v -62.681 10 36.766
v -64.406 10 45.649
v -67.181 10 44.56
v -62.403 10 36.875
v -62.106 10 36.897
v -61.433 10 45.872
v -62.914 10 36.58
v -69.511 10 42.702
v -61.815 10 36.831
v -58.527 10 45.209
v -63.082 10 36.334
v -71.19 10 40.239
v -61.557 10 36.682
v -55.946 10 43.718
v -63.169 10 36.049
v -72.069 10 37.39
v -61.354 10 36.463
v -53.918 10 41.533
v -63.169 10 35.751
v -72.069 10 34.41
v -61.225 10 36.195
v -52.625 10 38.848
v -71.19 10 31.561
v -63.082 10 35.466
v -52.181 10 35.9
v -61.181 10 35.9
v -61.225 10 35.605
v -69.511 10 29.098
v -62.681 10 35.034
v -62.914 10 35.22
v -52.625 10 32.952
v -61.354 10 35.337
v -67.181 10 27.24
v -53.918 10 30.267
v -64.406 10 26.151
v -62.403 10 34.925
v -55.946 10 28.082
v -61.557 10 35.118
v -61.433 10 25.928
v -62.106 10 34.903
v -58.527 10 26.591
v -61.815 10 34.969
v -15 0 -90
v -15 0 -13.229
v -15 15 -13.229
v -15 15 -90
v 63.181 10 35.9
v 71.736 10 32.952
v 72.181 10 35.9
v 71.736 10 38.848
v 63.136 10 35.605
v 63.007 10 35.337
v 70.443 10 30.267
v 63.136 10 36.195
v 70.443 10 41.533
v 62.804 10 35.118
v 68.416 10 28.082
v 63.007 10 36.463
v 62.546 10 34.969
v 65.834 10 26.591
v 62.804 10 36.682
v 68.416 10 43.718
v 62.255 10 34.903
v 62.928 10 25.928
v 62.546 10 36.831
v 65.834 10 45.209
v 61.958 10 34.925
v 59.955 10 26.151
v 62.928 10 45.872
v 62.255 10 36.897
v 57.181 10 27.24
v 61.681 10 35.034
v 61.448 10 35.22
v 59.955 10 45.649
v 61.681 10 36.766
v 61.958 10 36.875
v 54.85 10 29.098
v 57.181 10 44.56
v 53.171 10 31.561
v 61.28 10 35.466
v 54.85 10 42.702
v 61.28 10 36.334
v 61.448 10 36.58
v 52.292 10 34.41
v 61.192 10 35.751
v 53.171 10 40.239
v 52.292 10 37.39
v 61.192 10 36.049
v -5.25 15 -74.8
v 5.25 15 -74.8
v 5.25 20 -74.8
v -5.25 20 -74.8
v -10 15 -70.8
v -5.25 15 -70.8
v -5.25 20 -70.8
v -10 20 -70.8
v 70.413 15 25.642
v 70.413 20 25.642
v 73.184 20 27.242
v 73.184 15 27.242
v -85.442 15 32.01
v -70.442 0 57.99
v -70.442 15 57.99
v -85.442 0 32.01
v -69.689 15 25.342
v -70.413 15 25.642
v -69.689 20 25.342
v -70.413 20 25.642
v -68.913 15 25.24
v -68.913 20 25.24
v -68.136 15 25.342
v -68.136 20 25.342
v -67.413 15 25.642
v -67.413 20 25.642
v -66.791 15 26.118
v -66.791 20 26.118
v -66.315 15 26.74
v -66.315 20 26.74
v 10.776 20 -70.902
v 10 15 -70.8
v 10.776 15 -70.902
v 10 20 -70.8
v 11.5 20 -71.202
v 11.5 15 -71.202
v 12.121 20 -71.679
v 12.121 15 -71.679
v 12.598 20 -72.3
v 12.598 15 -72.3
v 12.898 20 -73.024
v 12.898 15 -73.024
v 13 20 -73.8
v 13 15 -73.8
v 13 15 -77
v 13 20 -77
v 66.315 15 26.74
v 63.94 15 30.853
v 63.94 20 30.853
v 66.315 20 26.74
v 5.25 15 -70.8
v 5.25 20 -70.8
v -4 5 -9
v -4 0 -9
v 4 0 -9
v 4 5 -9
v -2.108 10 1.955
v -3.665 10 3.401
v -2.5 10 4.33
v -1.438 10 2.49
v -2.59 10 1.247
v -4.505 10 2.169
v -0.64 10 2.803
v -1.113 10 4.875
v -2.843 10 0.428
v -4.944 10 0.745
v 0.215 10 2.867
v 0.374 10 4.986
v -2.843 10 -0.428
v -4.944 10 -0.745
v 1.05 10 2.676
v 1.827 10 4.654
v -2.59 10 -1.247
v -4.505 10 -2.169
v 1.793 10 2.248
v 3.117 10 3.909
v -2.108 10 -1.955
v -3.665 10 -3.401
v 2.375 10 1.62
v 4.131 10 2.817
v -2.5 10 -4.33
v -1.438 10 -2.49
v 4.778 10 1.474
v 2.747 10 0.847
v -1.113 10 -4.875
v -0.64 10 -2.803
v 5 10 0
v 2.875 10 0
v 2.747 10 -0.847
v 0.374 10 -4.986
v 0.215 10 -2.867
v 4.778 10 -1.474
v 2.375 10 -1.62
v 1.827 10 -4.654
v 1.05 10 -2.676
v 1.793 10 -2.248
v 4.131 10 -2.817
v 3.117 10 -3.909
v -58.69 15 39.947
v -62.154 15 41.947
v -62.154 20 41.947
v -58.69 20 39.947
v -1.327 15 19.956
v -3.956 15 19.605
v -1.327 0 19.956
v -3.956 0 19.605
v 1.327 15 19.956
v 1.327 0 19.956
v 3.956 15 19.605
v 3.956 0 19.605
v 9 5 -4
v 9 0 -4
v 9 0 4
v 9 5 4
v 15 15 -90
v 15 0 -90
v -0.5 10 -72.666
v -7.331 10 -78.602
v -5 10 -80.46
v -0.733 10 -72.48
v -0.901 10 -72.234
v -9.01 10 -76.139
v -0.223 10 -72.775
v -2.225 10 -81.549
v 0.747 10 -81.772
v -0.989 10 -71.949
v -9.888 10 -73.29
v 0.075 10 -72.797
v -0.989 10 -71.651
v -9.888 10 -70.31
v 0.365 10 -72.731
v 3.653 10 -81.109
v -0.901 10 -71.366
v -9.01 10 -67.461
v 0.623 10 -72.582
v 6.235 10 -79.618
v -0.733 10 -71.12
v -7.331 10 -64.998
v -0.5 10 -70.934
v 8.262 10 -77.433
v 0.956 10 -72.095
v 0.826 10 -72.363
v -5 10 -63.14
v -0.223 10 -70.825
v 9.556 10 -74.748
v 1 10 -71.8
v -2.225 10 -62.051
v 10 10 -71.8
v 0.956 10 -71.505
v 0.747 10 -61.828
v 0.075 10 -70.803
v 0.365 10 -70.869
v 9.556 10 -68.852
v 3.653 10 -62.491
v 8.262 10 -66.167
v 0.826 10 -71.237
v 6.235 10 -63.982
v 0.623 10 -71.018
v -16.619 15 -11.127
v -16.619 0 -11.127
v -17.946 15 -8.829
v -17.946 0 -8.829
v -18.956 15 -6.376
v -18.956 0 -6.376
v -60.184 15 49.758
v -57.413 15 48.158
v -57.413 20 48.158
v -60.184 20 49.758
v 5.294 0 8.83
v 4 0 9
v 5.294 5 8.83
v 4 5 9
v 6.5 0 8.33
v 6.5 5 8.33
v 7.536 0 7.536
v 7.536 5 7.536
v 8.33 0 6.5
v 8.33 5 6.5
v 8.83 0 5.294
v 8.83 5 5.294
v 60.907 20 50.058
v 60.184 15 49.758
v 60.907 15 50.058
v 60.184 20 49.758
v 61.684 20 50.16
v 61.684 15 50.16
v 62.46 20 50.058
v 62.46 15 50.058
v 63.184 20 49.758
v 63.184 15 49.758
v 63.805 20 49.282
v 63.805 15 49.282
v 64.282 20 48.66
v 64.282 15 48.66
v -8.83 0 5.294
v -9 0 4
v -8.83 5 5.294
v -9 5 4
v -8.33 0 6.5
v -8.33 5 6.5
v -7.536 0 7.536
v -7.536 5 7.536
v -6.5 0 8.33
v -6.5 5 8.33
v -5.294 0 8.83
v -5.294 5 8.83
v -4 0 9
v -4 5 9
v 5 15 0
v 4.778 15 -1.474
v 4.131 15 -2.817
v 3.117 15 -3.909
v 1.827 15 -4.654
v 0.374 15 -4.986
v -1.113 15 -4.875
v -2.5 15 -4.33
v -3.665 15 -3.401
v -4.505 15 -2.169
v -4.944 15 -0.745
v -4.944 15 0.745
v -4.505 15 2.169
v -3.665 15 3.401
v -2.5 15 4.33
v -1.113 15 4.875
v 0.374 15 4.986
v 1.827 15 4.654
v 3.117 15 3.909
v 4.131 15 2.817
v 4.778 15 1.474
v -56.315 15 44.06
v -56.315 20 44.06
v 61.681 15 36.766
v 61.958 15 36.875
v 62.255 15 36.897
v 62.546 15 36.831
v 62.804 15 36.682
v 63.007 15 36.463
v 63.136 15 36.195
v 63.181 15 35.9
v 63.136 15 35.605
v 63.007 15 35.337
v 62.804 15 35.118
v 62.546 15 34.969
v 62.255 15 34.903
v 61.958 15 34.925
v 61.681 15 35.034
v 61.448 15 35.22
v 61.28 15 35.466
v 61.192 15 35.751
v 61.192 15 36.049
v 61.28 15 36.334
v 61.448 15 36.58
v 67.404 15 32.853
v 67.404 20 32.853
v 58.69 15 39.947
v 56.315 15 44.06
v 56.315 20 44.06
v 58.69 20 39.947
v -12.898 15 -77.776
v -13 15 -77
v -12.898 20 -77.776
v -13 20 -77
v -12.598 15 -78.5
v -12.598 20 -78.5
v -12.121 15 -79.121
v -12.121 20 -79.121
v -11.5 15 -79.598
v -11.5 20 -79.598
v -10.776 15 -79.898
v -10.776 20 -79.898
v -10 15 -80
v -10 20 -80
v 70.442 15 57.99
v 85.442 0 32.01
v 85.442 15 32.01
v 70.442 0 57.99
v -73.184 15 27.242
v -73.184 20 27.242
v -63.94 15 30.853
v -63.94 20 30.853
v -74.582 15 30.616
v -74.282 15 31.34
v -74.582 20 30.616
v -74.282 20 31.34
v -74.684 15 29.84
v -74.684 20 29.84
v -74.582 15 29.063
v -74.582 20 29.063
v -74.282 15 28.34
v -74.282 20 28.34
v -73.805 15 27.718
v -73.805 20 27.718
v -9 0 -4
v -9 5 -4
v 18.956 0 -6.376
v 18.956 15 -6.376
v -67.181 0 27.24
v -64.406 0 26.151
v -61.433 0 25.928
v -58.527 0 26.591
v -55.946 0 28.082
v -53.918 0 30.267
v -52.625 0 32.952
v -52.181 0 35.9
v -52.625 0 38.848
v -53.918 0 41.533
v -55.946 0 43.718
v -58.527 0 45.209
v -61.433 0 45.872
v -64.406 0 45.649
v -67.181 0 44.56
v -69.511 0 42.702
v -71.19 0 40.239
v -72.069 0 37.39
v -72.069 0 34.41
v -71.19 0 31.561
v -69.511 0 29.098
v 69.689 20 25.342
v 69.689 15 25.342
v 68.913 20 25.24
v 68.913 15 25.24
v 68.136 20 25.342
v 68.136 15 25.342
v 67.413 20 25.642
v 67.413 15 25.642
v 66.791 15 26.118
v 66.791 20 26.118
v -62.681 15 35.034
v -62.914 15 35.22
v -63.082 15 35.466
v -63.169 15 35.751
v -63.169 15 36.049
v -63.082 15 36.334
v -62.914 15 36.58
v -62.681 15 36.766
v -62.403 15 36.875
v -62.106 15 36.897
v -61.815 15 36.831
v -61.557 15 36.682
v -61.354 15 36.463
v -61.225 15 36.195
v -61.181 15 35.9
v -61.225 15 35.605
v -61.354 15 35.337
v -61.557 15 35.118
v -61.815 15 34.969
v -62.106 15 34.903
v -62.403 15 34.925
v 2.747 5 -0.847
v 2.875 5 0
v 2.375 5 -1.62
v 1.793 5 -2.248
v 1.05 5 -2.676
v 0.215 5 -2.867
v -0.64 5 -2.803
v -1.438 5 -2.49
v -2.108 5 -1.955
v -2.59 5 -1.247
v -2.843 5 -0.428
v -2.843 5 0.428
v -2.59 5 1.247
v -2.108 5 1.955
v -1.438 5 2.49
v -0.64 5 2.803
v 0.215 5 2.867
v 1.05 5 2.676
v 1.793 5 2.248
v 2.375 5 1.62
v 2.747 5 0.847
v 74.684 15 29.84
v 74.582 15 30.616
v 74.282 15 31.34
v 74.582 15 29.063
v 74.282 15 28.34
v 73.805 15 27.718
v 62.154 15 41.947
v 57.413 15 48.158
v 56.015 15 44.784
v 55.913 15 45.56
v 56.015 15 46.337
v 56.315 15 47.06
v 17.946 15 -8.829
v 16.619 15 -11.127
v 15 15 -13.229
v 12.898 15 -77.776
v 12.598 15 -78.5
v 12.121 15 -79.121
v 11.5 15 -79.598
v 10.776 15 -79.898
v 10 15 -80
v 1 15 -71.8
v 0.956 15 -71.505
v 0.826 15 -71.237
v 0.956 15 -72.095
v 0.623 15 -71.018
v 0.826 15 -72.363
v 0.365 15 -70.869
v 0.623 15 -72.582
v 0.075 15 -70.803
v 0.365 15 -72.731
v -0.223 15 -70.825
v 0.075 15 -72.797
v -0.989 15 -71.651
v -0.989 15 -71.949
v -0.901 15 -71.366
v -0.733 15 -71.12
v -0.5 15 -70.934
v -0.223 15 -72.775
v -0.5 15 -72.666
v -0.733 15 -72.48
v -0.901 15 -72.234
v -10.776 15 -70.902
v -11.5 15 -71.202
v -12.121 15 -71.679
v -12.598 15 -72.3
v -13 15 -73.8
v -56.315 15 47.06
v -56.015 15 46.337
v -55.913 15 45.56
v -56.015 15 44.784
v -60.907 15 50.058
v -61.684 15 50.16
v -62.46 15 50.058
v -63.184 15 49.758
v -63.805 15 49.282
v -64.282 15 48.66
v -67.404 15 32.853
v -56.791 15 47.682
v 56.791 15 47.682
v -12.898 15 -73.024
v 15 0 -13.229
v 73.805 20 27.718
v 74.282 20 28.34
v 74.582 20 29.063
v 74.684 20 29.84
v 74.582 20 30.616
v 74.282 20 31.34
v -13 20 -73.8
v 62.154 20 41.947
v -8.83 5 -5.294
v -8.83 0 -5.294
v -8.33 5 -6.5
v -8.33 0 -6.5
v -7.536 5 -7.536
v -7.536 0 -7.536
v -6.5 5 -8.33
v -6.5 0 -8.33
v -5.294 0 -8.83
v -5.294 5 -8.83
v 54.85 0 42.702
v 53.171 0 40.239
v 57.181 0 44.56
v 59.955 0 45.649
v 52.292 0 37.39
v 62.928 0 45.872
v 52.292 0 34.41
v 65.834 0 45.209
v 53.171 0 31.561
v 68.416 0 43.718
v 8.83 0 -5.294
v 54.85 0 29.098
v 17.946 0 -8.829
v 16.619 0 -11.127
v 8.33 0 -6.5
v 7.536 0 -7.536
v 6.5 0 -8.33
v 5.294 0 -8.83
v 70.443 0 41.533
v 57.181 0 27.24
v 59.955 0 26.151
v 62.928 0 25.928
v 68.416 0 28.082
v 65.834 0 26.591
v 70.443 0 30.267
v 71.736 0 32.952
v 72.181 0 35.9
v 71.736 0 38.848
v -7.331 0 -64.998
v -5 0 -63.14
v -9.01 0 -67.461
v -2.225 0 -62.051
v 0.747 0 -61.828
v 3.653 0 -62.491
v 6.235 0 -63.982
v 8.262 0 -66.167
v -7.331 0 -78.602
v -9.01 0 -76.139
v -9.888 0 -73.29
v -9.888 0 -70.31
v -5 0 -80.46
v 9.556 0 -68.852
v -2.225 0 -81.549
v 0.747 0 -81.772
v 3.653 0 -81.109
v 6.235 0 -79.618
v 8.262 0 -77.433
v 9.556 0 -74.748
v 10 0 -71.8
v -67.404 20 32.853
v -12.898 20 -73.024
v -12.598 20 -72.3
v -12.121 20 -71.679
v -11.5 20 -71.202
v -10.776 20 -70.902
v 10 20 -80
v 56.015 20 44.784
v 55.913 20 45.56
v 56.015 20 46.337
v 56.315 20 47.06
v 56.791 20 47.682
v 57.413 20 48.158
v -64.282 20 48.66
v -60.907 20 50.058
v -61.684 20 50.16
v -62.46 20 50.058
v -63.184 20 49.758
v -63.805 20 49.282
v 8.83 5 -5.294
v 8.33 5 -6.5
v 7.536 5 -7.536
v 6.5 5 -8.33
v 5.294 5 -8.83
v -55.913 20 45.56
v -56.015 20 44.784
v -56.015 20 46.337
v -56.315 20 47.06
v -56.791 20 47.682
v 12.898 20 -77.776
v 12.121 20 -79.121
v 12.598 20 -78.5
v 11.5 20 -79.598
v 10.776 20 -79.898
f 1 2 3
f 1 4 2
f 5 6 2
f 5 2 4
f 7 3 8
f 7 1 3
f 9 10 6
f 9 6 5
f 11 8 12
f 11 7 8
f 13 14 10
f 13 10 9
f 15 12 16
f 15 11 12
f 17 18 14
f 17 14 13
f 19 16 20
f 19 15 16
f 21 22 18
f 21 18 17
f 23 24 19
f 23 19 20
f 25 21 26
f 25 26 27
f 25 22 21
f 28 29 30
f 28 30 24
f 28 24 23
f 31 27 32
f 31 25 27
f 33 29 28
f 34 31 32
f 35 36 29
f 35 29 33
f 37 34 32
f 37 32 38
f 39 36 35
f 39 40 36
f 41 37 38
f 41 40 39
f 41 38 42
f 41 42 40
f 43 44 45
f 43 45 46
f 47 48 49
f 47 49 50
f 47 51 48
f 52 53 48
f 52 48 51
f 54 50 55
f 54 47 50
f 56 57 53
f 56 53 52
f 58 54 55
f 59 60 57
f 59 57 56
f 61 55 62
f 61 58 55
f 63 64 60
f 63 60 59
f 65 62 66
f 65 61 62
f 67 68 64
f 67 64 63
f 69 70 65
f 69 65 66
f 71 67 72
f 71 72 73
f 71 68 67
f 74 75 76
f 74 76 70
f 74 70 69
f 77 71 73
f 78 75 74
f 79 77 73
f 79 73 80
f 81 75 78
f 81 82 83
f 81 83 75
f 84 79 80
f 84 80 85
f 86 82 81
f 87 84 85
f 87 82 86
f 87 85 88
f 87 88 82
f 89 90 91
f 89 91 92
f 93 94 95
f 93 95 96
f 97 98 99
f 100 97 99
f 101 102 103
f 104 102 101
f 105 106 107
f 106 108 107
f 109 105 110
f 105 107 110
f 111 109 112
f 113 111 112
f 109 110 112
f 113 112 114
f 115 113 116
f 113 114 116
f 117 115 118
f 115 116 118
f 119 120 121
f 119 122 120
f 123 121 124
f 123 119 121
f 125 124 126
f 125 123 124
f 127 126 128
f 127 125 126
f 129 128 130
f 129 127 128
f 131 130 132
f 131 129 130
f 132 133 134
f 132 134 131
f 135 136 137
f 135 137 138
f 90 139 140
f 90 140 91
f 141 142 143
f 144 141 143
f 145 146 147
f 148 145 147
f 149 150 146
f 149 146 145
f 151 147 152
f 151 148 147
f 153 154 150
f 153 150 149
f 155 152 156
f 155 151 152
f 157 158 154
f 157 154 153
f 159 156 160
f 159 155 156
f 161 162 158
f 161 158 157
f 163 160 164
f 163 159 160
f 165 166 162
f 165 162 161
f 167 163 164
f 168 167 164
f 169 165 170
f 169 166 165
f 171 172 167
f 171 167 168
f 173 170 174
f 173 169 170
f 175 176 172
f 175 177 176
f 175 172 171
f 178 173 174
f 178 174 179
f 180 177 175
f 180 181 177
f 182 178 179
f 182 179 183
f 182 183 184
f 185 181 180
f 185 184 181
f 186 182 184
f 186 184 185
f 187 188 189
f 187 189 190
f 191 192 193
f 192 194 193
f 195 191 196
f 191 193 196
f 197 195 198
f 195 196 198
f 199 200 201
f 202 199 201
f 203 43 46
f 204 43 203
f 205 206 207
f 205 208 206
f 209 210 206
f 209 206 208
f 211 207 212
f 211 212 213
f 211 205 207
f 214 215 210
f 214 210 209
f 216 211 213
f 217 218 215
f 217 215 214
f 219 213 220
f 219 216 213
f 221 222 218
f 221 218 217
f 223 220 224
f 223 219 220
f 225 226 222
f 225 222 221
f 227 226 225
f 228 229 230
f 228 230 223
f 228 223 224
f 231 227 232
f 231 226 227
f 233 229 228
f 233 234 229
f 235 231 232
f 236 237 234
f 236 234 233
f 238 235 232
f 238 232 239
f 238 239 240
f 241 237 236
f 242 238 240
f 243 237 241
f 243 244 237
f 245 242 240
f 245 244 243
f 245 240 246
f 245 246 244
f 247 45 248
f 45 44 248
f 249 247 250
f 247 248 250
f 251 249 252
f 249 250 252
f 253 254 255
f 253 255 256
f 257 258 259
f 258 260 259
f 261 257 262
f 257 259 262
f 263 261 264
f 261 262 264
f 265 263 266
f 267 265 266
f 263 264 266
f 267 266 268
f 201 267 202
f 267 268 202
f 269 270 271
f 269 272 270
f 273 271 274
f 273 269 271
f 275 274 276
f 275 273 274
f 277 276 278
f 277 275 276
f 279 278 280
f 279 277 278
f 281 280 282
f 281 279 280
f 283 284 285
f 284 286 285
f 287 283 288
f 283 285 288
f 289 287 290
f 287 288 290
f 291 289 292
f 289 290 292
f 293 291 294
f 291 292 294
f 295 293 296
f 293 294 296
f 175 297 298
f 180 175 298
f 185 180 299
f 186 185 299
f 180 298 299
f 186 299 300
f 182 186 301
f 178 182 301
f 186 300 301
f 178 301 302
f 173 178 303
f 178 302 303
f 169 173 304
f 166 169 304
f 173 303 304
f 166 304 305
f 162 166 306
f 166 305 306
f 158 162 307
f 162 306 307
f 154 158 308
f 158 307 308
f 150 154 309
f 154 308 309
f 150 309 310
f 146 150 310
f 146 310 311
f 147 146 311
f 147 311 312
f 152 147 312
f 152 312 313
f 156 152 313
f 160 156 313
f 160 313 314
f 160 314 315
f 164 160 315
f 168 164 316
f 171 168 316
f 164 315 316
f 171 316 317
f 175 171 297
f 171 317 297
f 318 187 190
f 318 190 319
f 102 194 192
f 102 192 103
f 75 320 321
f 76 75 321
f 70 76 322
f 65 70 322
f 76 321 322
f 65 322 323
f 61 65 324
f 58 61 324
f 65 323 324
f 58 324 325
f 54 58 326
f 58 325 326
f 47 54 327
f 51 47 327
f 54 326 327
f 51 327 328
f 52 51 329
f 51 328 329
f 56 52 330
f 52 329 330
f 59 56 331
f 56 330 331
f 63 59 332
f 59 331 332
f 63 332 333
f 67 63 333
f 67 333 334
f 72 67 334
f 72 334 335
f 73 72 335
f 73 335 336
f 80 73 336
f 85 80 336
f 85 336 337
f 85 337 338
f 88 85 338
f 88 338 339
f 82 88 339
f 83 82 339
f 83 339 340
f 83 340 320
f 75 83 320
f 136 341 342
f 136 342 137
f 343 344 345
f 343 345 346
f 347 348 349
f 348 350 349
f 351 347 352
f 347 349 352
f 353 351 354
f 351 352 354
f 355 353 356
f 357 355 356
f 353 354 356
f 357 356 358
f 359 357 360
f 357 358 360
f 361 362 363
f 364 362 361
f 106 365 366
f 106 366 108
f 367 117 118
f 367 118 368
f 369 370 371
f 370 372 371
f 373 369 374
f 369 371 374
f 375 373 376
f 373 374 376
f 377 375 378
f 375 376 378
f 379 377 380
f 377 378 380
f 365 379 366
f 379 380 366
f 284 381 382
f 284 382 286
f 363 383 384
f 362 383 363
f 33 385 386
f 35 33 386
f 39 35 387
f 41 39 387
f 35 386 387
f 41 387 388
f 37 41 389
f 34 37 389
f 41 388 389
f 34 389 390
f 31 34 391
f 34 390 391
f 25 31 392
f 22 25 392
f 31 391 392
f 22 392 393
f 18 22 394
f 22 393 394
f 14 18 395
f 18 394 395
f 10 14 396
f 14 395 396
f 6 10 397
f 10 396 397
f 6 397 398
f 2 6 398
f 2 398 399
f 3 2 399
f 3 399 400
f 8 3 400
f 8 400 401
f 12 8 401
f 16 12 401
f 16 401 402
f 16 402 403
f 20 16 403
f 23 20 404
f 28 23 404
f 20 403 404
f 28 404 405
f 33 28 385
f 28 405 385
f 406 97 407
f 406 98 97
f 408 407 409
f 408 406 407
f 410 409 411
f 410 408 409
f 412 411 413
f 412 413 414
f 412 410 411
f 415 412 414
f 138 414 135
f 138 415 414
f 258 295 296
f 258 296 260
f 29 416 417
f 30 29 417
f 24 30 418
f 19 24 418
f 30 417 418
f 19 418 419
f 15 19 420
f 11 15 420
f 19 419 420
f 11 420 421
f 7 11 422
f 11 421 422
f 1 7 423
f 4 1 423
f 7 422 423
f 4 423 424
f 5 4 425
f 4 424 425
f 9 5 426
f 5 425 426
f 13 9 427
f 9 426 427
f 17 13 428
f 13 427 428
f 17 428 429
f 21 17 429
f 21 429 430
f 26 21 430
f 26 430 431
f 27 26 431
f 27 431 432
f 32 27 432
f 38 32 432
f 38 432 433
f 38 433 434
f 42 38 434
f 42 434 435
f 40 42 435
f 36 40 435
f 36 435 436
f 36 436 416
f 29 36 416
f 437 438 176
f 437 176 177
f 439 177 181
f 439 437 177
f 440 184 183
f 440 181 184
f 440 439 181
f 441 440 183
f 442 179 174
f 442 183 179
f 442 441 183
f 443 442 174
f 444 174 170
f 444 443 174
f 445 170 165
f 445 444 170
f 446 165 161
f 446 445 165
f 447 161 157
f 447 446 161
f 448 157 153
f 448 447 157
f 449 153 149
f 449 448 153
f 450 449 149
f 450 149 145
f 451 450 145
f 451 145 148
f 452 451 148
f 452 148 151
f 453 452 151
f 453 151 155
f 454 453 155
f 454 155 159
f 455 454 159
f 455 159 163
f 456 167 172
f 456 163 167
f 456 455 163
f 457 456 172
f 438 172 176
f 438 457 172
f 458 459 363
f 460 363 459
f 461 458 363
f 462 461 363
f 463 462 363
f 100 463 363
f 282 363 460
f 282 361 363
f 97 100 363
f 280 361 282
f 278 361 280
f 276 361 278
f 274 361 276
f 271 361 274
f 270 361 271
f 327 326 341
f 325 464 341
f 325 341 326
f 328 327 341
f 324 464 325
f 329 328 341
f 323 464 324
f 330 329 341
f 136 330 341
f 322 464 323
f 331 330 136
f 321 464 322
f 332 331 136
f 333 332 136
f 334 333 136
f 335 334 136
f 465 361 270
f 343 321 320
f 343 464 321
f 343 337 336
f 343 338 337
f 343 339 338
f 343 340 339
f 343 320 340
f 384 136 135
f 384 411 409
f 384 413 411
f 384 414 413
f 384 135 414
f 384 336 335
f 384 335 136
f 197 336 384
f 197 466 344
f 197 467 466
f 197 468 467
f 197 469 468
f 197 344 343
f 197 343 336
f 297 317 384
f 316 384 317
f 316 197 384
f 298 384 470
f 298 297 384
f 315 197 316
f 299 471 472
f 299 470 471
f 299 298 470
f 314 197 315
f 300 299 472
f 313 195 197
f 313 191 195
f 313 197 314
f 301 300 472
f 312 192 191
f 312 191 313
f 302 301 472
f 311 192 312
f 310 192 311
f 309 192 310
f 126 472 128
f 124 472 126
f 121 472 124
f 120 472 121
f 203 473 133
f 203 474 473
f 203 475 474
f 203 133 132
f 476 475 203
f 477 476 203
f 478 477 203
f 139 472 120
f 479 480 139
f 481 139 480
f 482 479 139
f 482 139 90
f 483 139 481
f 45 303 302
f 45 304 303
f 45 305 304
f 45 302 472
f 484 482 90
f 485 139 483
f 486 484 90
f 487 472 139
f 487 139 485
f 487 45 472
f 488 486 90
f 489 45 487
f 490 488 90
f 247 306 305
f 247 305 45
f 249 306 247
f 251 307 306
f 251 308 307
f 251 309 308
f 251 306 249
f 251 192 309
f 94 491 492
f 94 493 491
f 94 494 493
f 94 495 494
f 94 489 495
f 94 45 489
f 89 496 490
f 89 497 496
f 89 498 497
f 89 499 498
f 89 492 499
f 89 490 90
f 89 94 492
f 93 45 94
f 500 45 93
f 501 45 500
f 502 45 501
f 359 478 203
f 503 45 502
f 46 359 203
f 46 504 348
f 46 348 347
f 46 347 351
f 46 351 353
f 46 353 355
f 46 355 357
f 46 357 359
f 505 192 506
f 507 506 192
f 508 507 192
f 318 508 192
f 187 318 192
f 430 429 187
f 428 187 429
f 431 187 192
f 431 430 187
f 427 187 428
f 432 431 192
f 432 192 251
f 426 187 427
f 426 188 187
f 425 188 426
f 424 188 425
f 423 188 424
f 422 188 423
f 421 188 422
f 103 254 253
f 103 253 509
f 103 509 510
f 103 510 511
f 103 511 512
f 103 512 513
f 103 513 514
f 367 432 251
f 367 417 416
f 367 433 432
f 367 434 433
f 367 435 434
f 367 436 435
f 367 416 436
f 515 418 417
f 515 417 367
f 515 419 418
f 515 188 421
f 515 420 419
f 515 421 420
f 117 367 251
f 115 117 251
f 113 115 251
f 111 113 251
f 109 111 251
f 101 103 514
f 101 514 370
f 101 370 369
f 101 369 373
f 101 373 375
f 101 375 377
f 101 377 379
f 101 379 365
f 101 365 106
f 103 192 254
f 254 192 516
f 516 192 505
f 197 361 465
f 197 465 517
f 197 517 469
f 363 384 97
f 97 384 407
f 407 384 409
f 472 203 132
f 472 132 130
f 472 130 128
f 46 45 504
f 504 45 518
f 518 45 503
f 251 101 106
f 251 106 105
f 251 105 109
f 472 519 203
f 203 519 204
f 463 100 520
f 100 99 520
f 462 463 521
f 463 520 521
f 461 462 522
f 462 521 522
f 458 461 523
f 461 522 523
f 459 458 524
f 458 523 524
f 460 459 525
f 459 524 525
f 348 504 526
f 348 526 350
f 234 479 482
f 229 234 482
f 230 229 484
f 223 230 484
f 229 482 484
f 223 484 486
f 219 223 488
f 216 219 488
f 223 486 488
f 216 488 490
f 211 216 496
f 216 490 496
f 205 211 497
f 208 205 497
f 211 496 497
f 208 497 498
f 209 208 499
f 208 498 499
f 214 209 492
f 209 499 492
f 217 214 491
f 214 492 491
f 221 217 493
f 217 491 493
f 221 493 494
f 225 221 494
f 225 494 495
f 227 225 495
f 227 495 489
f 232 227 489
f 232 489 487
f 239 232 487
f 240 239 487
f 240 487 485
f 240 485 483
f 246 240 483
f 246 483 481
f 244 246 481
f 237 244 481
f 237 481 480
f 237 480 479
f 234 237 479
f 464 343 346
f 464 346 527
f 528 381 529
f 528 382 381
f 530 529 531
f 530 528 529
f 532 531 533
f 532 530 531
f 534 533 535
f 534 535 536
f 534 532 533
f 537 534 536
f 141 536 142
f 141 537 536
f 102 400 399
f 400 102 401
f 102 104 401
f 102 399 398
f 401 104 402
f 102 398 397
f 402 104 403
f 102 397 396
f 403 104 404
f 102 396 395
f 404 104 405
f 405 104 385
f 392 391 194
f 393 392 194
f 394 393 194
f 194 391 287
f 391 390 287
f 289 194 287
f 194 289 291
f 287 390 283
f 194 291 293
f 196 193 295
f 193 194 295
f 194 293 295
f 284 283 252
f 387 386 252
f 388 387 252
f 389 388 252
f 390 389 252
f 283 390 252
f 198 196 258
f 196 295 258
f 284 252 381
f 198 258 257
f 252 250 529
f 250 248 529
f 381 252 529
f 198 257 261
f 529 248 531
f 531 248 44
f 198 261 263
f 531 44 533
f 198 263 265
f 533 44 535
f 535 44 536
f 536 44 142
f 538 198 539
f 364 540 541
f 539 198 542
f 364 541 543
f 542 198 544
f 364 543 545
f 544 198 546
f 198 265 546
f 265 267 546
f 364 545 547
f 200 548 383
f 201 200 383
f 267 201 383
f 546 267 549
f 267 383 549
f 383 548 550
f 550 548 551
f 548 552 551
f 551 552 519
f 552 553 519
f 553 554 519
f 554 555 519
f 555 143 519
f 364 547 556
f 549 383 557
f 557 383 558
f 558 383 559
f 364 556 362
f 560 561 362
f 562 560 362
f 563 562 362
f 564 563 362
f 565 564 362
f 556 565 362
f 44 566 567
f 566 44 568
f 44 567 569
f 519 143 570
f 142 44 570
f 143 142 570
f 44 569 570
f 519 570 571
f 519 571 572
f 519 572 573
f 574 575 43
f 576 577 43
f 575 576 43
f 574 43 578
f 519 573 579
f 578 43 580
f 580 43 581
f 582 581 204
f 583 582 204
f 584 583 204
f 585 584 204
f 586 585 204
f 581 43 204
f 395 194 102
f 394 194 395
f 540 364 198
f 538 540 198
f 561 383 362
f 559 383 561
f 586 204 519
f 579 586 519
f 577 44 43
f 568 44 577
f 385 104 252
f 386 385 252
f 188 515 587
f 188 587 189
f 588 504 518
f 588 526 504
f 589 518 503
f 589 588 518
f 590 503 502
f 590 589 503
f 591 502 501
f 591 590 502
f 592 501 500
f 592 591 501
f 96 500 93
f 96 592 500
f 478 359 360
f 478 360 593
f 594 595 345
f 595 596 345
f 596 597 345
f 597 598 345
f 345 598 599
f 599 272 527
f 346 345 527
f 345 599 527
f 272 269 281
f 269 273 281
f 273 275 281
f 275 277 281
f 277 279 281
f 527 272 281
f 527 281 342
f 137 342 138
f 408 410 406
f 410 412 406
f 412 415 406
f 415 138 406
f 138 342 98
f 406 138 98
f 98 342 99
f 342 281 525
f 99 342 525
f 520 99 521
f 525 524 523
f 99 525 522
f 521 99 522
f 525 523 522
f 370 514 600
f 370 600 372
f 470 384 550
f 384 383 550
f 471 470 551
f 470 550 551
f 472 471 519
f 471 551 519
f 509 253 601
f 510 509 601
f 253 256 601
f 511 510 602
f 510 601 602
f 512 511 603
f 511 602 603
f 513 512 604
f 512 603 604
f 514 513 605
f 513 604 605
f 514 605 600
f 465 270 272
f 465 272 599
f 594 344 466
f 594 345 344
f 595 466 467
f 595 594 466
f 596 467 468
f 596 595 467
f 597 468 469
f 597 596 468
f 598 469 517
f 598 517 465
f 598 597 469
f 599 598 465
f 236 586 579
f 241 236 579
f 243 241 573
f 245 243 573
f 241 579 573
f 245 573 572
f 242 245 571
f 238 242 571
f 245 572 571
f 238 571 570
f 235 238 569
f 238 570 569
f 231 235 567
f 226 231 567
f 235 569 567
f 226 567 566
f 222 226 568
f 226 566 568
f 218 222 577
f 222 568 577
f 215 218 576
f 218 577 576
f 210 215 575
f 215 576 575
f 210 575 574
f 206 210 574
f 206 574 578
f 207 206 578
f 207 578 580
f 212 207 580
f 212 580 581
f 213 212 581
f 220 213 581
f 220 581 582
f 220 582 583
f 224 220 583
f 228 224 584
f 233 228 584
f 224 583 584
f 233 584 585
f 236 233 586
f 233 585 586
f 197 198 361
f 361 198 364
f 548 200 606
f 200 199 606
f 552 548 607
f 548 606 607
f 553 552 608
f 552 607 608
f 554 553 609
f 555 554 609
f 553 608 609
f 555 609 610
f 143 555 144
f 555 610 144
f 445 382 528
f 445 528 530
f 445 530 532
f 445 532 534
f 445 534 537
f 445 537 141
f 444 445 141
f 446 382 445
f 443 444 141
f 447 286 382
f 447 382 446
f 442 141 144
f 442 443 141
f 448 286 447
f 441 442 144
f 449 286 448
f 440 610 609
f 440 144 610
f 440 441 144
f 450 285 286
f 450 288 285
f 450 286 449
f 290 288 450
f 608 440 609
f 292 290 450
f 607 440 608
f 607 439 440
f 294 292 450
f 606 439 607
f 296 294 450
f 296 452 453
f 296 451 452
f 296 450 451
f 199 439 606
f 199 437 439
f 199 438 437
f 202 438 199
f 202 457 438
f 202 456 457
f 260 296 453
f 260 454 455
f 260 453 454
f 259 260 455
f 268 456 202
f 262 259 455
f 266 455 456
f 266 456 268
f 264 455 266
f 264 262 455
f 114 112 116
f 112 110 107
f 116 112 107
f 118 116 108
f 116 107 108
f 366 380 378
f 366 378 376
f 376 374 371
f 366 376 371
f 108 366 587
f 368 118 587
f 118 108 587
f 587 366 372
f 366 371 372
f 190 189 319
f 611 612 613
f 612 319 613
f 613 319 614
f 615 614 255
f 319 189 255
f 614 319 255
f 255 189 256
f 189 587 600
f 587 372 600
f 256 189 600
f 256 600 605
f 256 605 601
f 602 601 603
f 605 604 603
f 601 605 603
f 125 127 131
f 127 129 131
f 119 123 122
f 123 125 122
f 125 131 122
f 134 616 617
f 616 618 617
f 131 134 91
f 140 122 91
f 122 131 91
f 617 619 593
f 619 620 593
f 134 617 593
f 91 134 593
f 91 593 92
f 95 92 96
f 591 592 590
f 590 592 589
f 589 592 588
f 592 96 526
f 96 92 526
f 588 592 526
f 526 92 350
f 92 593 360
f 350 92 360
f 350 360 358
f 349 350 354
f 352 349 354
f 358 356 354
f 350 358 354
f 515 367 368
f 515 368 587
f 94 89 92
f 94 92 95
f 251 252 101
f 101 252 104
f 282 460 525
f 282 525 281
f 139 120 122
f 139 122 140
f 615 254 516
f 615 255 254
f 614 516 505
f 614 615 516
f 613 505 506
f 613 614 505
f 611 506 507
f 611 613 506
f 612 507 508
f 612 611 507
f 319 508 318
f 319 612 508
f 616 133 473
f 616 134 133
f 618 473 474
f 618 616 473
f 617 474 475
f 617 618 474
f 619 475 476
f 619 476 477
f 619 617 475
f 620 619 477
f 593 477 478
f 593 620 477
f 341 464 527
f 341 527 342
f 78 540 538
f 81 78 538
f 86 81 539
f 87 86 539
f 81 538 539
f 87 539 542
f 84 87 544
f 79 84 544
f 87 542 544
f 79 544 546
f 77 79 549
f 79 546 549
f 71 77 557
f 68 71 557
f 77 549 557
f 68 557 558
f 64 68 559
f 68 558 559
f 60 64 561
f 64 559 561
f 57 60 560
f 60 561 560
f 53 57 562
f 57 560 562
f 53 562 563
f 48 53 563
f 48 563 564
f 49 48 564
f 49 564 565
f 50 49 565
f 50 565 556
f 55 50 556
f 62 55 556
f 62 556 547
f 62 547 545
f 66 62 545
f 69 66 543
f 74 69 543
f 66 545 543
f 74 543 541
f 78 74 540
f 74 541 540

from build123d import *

# Parameters (mm, degrees)
SKETCH5_R                = 20
BOSS_EXTRUDE2_DEPTH      = 15
SKETCH6_W                = 30
SKETCH6_H                = 90
BOSS_EXTRUDE3_DEPTH      = 15
CIRPATTERN1_COUNT        = 3
BOSS_EXTRUDE4_DEPTH      = 5
FILLET1_R                = 3
SKETCH8_R                = 1
CUT_EXTRUDE1_DEPTH       = 16
SKETCH9_R                = 10
CUT_EXTRUDE2_DEPTH       = 10
CIRPATTERN4_COUNT        = 3
FILLET1_OF_CIRPATTERN4_R = 3
CIRPATTERN6_COUNT        = 3
CUT_EXTRUDE4_REACH       = 22
SKETCH11_R               = 2.875
SKETCH13_W               = 18
SKETCH13_H               = 18
CUT_EXTRUDE5_DEPTH       = 5
FILLET2_R                = 5
SKETCH14_R               = 5
CUT_EXTRUDE6_DEPTH       = 5


with BuildPart() as part:
    # Sketch5 → Boss-Extrude2 (new body)
    with BuildSketch(Plane(origin=(0, 0, 0), x_dir=(1, 0, 0), z_dir=(0, 1, 0))):
        Circle(SKETCH5_R)
    extrude(amount=BOSS_EXTRUDE2_DEPTH)

    # Sketch6 → Boss-Extrude3 (add)
    with BuildSketch(Plane(origin=(0, 0, 0), x_dir=(1, 0, 0), z_dir=(0, 1, 0))):
        with Locations((0, 45)):
            Rectangle(SKETCH6_W, SKETCH6_H)
    boss_extrude3 = extrude(amount=BOSS_EXTRUDE3_DEPTH)

    # CirPattern1: Boss-Extrude3 ×3 about axis
    cirpattern1_axis = Axis((0, 0, 0), (0, 1, 0))
    for i in range(1, CIRPATTERN1_COUNT):
        add(boss_extrude3.rotate(cirpattern1_axis, i * 360 / CIRPATTERN1_COUNT))

    # Sketch7 → Boss-Extrude4 (add)
    with BuildSketch(Plane(origin=(0, 15, 0), x_dir=(1, 0, 0), z_dir=(0, 1, 0))):
        Polygon((-13, 80), (13, 80), (13, 70.8), (5.25, 70.8), (5.25, 74.8), (-5.25, 74.8), (-5.25, 70.8), (-13, 70.8), align=None)
    boss_extrude4 = extrude(amount=BOSS_EXTRUDE4_DEPTH)

    # Fillet1
    fillet1_edges = [part.edges().sort_by_distance(p)[0] for p in [
        (-13, 17.5, -80),
        (-13, 17.5, -70.8),
        (13, 17.5, -70.8),
        (13, 17.5, -80),
    ]]
    fillet(fillet1_edges, radius=FILLET1_R)

    # Sketch8 → Cut-Extrude1 (cut, through all)
    with BuildSketch(Plane(origin=(0, 15, 0), x_dir=(1, 0, 0), z_dir=(0, 1, 0))):
        with Locations((0, 71.8)):
            Circle(SKETCH8_R)
    cut_extrude1 = extrude(amount=-CUT_EXTRUDE1_DEPTH, mode=Mode.SUBTRACT)

    # Sketch9 → Cut-Extrude2 (cut)
    with BuildSketch(Plane.XZ):
        with Locations((0, -71.8)):
            Circle(SKETCH9_R)
    cut_extrude2 = extrude(amount=-CUT_EXTRUDE2_DEPTH, mode=Mode.SUBTRACT)

    # CirPattern4: Boss-Extrude4 ×3 about axis
    cirpattern4_axis = Axis((0, 0, 0), (0, 1, 0))
    for i in range(1, CIRPATTERN4_COUNT):
        add(boss_extrude4.rotate(cirpattern4_axis, i * 360 / CIRPATTERN4_COUNT))

    # Fillet1 of CirPattern4
    fillet1_of_cirpattern4_edges = [part.edges().sort_by_distance(p)[0] for p in [
        (-62.782032303, 17.5, 51.258330249),
        (-54.814598588, 17.5, 46.658330249),
        (-67.814598588, 17.5, 24.141669751),
        (-75.782032303, 17.5, 28.741669751),
        (75.782032303, 17.5, 28.741669751),
        (67.814598588, 17.5, 24.141669751),
        (54.814598588, 17.5, 46.658330249),
        (62.782032303, 17.5, 51.258330249),
    ]]
    fillet(fillet1_of_cirpattern4_edges, radius=FILLET1_OF_CIRPATTERN4_R)

    # CirPattern6: Cut-Extrude1, Cut-Extrude2 ×3 about axis
    cirpattern6_axis = Axis((0, 0, 0), (0, 1, 0))
    for i in range(1, CIRPATTERN6_COUNT):
        add(cut_extrude1.rotate(cirpattern6_axis, i * 360 / CIRPATTERN6_COUNT), mode=Mode.SUBTRACT)
        add(cut_extrude2.rotate(cirpattern6_axis, i * 360 / CIRPATTERN6_COUNT), mode=Mode.SUBTRACT)

    # Sketch11 → Cut-Extrude4 (cut, up to next)
    with BuildSketch(Plane(origin=(0, 0, 0), x_dir=(1, 0, 0), z_dir=(0, 1, 0)), mode=Mode.PRIVATE) as cut_extrude4_sk1:
        Circle(SKETCH11_R)
    cut_extrude4_tool1 = extrude(cut_extrude4_sk1.sketch, amount=CUT_EXTRUDE4_REACH, mode=Mode.PRIVATE) & part.part
    add(cut_extrude4_tool1.solids().sort_by_distance((0, 0, 0))[0], mode=Mode.SUBTRACT)

    # Sketch13 → Cut-Extrude5 (cut)
    with BuildSketch(Plane.XZ):
        Rectangle(SKETCH13_W, SKETCH13_H)
    extrude(amount=-CUT_EXTRUDE5_DEPTH, mode=Mode.SUBTRACT)

    # Fillet2
    fillet2_edges = [part.edges().sort_by_distance(p)[0] for p in [
        (9, 2.5, 9),
        (9, 2.5, -9),
        (-9, 2.5, -9),
        (-9, 2.5, 9),
    ]]
    fillet(fillet2_edges, radius=FILLET2_R)

    # Sketch14 → Cut-Extrude6 (cut)
    with BuildSketch(Plane(origin=(0, 15, 0), x_dir=(1, 0, 0), z_dir=(0, 1, 0))):
        Circle(SKETCH14_R)
    extrude(amount=-CUT_EXTRUDE6_DEPTH, mode=Mode.SUBTRACT)


solid = part.part
